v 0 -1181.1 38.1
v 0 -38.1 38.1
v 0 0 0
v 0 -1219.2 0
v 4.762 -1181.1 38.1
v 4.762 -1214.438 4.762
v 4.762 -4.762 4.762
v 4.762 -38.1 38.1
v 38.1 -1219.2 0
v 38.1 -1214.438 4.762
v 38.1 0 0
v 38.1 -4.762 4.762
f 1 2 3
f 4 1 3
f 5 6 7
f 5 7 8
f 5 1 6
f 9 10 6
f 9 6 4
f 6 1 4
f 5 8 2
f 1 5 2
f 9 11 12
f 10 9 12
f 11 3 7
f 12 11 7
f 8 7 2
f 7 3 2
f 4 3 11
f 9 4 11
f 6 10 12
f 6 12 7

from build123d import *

# Parameters (mm, degrees)
F1_DEPTH = 1219.2
F3_DEPTH = 38.101


with BuildPart() as f1:
    # F0 (on Front) → F1 (new body)
    with BuildSketch(Plane.XZ):
        Polygon((0, 38.1), (0, 0), (38.1, 0), (38.1, 4.7625), (4.7625, 4.7625), (4.7625, 38.1), align=None)
    extrude(amount=F1_DEPTH)

    # F2 (on face) → F3 (cut, through all)
    with BuildSketch(Plane(origin=(0, 0, 0), x_dir=(0, -1, 0), z_dir=(-1, 0, 0))):
        Polygon((1181.1, 38.1), (1219.2, 0), (1219.2, 38.1), align=None)
        Polygon((0, 0), (38.1, 38.1), (0, 38.1), align=None)
    extrude(amount=-F3_DEPTH, mode=Mode.SUBTRACT)


solid = f1.part
